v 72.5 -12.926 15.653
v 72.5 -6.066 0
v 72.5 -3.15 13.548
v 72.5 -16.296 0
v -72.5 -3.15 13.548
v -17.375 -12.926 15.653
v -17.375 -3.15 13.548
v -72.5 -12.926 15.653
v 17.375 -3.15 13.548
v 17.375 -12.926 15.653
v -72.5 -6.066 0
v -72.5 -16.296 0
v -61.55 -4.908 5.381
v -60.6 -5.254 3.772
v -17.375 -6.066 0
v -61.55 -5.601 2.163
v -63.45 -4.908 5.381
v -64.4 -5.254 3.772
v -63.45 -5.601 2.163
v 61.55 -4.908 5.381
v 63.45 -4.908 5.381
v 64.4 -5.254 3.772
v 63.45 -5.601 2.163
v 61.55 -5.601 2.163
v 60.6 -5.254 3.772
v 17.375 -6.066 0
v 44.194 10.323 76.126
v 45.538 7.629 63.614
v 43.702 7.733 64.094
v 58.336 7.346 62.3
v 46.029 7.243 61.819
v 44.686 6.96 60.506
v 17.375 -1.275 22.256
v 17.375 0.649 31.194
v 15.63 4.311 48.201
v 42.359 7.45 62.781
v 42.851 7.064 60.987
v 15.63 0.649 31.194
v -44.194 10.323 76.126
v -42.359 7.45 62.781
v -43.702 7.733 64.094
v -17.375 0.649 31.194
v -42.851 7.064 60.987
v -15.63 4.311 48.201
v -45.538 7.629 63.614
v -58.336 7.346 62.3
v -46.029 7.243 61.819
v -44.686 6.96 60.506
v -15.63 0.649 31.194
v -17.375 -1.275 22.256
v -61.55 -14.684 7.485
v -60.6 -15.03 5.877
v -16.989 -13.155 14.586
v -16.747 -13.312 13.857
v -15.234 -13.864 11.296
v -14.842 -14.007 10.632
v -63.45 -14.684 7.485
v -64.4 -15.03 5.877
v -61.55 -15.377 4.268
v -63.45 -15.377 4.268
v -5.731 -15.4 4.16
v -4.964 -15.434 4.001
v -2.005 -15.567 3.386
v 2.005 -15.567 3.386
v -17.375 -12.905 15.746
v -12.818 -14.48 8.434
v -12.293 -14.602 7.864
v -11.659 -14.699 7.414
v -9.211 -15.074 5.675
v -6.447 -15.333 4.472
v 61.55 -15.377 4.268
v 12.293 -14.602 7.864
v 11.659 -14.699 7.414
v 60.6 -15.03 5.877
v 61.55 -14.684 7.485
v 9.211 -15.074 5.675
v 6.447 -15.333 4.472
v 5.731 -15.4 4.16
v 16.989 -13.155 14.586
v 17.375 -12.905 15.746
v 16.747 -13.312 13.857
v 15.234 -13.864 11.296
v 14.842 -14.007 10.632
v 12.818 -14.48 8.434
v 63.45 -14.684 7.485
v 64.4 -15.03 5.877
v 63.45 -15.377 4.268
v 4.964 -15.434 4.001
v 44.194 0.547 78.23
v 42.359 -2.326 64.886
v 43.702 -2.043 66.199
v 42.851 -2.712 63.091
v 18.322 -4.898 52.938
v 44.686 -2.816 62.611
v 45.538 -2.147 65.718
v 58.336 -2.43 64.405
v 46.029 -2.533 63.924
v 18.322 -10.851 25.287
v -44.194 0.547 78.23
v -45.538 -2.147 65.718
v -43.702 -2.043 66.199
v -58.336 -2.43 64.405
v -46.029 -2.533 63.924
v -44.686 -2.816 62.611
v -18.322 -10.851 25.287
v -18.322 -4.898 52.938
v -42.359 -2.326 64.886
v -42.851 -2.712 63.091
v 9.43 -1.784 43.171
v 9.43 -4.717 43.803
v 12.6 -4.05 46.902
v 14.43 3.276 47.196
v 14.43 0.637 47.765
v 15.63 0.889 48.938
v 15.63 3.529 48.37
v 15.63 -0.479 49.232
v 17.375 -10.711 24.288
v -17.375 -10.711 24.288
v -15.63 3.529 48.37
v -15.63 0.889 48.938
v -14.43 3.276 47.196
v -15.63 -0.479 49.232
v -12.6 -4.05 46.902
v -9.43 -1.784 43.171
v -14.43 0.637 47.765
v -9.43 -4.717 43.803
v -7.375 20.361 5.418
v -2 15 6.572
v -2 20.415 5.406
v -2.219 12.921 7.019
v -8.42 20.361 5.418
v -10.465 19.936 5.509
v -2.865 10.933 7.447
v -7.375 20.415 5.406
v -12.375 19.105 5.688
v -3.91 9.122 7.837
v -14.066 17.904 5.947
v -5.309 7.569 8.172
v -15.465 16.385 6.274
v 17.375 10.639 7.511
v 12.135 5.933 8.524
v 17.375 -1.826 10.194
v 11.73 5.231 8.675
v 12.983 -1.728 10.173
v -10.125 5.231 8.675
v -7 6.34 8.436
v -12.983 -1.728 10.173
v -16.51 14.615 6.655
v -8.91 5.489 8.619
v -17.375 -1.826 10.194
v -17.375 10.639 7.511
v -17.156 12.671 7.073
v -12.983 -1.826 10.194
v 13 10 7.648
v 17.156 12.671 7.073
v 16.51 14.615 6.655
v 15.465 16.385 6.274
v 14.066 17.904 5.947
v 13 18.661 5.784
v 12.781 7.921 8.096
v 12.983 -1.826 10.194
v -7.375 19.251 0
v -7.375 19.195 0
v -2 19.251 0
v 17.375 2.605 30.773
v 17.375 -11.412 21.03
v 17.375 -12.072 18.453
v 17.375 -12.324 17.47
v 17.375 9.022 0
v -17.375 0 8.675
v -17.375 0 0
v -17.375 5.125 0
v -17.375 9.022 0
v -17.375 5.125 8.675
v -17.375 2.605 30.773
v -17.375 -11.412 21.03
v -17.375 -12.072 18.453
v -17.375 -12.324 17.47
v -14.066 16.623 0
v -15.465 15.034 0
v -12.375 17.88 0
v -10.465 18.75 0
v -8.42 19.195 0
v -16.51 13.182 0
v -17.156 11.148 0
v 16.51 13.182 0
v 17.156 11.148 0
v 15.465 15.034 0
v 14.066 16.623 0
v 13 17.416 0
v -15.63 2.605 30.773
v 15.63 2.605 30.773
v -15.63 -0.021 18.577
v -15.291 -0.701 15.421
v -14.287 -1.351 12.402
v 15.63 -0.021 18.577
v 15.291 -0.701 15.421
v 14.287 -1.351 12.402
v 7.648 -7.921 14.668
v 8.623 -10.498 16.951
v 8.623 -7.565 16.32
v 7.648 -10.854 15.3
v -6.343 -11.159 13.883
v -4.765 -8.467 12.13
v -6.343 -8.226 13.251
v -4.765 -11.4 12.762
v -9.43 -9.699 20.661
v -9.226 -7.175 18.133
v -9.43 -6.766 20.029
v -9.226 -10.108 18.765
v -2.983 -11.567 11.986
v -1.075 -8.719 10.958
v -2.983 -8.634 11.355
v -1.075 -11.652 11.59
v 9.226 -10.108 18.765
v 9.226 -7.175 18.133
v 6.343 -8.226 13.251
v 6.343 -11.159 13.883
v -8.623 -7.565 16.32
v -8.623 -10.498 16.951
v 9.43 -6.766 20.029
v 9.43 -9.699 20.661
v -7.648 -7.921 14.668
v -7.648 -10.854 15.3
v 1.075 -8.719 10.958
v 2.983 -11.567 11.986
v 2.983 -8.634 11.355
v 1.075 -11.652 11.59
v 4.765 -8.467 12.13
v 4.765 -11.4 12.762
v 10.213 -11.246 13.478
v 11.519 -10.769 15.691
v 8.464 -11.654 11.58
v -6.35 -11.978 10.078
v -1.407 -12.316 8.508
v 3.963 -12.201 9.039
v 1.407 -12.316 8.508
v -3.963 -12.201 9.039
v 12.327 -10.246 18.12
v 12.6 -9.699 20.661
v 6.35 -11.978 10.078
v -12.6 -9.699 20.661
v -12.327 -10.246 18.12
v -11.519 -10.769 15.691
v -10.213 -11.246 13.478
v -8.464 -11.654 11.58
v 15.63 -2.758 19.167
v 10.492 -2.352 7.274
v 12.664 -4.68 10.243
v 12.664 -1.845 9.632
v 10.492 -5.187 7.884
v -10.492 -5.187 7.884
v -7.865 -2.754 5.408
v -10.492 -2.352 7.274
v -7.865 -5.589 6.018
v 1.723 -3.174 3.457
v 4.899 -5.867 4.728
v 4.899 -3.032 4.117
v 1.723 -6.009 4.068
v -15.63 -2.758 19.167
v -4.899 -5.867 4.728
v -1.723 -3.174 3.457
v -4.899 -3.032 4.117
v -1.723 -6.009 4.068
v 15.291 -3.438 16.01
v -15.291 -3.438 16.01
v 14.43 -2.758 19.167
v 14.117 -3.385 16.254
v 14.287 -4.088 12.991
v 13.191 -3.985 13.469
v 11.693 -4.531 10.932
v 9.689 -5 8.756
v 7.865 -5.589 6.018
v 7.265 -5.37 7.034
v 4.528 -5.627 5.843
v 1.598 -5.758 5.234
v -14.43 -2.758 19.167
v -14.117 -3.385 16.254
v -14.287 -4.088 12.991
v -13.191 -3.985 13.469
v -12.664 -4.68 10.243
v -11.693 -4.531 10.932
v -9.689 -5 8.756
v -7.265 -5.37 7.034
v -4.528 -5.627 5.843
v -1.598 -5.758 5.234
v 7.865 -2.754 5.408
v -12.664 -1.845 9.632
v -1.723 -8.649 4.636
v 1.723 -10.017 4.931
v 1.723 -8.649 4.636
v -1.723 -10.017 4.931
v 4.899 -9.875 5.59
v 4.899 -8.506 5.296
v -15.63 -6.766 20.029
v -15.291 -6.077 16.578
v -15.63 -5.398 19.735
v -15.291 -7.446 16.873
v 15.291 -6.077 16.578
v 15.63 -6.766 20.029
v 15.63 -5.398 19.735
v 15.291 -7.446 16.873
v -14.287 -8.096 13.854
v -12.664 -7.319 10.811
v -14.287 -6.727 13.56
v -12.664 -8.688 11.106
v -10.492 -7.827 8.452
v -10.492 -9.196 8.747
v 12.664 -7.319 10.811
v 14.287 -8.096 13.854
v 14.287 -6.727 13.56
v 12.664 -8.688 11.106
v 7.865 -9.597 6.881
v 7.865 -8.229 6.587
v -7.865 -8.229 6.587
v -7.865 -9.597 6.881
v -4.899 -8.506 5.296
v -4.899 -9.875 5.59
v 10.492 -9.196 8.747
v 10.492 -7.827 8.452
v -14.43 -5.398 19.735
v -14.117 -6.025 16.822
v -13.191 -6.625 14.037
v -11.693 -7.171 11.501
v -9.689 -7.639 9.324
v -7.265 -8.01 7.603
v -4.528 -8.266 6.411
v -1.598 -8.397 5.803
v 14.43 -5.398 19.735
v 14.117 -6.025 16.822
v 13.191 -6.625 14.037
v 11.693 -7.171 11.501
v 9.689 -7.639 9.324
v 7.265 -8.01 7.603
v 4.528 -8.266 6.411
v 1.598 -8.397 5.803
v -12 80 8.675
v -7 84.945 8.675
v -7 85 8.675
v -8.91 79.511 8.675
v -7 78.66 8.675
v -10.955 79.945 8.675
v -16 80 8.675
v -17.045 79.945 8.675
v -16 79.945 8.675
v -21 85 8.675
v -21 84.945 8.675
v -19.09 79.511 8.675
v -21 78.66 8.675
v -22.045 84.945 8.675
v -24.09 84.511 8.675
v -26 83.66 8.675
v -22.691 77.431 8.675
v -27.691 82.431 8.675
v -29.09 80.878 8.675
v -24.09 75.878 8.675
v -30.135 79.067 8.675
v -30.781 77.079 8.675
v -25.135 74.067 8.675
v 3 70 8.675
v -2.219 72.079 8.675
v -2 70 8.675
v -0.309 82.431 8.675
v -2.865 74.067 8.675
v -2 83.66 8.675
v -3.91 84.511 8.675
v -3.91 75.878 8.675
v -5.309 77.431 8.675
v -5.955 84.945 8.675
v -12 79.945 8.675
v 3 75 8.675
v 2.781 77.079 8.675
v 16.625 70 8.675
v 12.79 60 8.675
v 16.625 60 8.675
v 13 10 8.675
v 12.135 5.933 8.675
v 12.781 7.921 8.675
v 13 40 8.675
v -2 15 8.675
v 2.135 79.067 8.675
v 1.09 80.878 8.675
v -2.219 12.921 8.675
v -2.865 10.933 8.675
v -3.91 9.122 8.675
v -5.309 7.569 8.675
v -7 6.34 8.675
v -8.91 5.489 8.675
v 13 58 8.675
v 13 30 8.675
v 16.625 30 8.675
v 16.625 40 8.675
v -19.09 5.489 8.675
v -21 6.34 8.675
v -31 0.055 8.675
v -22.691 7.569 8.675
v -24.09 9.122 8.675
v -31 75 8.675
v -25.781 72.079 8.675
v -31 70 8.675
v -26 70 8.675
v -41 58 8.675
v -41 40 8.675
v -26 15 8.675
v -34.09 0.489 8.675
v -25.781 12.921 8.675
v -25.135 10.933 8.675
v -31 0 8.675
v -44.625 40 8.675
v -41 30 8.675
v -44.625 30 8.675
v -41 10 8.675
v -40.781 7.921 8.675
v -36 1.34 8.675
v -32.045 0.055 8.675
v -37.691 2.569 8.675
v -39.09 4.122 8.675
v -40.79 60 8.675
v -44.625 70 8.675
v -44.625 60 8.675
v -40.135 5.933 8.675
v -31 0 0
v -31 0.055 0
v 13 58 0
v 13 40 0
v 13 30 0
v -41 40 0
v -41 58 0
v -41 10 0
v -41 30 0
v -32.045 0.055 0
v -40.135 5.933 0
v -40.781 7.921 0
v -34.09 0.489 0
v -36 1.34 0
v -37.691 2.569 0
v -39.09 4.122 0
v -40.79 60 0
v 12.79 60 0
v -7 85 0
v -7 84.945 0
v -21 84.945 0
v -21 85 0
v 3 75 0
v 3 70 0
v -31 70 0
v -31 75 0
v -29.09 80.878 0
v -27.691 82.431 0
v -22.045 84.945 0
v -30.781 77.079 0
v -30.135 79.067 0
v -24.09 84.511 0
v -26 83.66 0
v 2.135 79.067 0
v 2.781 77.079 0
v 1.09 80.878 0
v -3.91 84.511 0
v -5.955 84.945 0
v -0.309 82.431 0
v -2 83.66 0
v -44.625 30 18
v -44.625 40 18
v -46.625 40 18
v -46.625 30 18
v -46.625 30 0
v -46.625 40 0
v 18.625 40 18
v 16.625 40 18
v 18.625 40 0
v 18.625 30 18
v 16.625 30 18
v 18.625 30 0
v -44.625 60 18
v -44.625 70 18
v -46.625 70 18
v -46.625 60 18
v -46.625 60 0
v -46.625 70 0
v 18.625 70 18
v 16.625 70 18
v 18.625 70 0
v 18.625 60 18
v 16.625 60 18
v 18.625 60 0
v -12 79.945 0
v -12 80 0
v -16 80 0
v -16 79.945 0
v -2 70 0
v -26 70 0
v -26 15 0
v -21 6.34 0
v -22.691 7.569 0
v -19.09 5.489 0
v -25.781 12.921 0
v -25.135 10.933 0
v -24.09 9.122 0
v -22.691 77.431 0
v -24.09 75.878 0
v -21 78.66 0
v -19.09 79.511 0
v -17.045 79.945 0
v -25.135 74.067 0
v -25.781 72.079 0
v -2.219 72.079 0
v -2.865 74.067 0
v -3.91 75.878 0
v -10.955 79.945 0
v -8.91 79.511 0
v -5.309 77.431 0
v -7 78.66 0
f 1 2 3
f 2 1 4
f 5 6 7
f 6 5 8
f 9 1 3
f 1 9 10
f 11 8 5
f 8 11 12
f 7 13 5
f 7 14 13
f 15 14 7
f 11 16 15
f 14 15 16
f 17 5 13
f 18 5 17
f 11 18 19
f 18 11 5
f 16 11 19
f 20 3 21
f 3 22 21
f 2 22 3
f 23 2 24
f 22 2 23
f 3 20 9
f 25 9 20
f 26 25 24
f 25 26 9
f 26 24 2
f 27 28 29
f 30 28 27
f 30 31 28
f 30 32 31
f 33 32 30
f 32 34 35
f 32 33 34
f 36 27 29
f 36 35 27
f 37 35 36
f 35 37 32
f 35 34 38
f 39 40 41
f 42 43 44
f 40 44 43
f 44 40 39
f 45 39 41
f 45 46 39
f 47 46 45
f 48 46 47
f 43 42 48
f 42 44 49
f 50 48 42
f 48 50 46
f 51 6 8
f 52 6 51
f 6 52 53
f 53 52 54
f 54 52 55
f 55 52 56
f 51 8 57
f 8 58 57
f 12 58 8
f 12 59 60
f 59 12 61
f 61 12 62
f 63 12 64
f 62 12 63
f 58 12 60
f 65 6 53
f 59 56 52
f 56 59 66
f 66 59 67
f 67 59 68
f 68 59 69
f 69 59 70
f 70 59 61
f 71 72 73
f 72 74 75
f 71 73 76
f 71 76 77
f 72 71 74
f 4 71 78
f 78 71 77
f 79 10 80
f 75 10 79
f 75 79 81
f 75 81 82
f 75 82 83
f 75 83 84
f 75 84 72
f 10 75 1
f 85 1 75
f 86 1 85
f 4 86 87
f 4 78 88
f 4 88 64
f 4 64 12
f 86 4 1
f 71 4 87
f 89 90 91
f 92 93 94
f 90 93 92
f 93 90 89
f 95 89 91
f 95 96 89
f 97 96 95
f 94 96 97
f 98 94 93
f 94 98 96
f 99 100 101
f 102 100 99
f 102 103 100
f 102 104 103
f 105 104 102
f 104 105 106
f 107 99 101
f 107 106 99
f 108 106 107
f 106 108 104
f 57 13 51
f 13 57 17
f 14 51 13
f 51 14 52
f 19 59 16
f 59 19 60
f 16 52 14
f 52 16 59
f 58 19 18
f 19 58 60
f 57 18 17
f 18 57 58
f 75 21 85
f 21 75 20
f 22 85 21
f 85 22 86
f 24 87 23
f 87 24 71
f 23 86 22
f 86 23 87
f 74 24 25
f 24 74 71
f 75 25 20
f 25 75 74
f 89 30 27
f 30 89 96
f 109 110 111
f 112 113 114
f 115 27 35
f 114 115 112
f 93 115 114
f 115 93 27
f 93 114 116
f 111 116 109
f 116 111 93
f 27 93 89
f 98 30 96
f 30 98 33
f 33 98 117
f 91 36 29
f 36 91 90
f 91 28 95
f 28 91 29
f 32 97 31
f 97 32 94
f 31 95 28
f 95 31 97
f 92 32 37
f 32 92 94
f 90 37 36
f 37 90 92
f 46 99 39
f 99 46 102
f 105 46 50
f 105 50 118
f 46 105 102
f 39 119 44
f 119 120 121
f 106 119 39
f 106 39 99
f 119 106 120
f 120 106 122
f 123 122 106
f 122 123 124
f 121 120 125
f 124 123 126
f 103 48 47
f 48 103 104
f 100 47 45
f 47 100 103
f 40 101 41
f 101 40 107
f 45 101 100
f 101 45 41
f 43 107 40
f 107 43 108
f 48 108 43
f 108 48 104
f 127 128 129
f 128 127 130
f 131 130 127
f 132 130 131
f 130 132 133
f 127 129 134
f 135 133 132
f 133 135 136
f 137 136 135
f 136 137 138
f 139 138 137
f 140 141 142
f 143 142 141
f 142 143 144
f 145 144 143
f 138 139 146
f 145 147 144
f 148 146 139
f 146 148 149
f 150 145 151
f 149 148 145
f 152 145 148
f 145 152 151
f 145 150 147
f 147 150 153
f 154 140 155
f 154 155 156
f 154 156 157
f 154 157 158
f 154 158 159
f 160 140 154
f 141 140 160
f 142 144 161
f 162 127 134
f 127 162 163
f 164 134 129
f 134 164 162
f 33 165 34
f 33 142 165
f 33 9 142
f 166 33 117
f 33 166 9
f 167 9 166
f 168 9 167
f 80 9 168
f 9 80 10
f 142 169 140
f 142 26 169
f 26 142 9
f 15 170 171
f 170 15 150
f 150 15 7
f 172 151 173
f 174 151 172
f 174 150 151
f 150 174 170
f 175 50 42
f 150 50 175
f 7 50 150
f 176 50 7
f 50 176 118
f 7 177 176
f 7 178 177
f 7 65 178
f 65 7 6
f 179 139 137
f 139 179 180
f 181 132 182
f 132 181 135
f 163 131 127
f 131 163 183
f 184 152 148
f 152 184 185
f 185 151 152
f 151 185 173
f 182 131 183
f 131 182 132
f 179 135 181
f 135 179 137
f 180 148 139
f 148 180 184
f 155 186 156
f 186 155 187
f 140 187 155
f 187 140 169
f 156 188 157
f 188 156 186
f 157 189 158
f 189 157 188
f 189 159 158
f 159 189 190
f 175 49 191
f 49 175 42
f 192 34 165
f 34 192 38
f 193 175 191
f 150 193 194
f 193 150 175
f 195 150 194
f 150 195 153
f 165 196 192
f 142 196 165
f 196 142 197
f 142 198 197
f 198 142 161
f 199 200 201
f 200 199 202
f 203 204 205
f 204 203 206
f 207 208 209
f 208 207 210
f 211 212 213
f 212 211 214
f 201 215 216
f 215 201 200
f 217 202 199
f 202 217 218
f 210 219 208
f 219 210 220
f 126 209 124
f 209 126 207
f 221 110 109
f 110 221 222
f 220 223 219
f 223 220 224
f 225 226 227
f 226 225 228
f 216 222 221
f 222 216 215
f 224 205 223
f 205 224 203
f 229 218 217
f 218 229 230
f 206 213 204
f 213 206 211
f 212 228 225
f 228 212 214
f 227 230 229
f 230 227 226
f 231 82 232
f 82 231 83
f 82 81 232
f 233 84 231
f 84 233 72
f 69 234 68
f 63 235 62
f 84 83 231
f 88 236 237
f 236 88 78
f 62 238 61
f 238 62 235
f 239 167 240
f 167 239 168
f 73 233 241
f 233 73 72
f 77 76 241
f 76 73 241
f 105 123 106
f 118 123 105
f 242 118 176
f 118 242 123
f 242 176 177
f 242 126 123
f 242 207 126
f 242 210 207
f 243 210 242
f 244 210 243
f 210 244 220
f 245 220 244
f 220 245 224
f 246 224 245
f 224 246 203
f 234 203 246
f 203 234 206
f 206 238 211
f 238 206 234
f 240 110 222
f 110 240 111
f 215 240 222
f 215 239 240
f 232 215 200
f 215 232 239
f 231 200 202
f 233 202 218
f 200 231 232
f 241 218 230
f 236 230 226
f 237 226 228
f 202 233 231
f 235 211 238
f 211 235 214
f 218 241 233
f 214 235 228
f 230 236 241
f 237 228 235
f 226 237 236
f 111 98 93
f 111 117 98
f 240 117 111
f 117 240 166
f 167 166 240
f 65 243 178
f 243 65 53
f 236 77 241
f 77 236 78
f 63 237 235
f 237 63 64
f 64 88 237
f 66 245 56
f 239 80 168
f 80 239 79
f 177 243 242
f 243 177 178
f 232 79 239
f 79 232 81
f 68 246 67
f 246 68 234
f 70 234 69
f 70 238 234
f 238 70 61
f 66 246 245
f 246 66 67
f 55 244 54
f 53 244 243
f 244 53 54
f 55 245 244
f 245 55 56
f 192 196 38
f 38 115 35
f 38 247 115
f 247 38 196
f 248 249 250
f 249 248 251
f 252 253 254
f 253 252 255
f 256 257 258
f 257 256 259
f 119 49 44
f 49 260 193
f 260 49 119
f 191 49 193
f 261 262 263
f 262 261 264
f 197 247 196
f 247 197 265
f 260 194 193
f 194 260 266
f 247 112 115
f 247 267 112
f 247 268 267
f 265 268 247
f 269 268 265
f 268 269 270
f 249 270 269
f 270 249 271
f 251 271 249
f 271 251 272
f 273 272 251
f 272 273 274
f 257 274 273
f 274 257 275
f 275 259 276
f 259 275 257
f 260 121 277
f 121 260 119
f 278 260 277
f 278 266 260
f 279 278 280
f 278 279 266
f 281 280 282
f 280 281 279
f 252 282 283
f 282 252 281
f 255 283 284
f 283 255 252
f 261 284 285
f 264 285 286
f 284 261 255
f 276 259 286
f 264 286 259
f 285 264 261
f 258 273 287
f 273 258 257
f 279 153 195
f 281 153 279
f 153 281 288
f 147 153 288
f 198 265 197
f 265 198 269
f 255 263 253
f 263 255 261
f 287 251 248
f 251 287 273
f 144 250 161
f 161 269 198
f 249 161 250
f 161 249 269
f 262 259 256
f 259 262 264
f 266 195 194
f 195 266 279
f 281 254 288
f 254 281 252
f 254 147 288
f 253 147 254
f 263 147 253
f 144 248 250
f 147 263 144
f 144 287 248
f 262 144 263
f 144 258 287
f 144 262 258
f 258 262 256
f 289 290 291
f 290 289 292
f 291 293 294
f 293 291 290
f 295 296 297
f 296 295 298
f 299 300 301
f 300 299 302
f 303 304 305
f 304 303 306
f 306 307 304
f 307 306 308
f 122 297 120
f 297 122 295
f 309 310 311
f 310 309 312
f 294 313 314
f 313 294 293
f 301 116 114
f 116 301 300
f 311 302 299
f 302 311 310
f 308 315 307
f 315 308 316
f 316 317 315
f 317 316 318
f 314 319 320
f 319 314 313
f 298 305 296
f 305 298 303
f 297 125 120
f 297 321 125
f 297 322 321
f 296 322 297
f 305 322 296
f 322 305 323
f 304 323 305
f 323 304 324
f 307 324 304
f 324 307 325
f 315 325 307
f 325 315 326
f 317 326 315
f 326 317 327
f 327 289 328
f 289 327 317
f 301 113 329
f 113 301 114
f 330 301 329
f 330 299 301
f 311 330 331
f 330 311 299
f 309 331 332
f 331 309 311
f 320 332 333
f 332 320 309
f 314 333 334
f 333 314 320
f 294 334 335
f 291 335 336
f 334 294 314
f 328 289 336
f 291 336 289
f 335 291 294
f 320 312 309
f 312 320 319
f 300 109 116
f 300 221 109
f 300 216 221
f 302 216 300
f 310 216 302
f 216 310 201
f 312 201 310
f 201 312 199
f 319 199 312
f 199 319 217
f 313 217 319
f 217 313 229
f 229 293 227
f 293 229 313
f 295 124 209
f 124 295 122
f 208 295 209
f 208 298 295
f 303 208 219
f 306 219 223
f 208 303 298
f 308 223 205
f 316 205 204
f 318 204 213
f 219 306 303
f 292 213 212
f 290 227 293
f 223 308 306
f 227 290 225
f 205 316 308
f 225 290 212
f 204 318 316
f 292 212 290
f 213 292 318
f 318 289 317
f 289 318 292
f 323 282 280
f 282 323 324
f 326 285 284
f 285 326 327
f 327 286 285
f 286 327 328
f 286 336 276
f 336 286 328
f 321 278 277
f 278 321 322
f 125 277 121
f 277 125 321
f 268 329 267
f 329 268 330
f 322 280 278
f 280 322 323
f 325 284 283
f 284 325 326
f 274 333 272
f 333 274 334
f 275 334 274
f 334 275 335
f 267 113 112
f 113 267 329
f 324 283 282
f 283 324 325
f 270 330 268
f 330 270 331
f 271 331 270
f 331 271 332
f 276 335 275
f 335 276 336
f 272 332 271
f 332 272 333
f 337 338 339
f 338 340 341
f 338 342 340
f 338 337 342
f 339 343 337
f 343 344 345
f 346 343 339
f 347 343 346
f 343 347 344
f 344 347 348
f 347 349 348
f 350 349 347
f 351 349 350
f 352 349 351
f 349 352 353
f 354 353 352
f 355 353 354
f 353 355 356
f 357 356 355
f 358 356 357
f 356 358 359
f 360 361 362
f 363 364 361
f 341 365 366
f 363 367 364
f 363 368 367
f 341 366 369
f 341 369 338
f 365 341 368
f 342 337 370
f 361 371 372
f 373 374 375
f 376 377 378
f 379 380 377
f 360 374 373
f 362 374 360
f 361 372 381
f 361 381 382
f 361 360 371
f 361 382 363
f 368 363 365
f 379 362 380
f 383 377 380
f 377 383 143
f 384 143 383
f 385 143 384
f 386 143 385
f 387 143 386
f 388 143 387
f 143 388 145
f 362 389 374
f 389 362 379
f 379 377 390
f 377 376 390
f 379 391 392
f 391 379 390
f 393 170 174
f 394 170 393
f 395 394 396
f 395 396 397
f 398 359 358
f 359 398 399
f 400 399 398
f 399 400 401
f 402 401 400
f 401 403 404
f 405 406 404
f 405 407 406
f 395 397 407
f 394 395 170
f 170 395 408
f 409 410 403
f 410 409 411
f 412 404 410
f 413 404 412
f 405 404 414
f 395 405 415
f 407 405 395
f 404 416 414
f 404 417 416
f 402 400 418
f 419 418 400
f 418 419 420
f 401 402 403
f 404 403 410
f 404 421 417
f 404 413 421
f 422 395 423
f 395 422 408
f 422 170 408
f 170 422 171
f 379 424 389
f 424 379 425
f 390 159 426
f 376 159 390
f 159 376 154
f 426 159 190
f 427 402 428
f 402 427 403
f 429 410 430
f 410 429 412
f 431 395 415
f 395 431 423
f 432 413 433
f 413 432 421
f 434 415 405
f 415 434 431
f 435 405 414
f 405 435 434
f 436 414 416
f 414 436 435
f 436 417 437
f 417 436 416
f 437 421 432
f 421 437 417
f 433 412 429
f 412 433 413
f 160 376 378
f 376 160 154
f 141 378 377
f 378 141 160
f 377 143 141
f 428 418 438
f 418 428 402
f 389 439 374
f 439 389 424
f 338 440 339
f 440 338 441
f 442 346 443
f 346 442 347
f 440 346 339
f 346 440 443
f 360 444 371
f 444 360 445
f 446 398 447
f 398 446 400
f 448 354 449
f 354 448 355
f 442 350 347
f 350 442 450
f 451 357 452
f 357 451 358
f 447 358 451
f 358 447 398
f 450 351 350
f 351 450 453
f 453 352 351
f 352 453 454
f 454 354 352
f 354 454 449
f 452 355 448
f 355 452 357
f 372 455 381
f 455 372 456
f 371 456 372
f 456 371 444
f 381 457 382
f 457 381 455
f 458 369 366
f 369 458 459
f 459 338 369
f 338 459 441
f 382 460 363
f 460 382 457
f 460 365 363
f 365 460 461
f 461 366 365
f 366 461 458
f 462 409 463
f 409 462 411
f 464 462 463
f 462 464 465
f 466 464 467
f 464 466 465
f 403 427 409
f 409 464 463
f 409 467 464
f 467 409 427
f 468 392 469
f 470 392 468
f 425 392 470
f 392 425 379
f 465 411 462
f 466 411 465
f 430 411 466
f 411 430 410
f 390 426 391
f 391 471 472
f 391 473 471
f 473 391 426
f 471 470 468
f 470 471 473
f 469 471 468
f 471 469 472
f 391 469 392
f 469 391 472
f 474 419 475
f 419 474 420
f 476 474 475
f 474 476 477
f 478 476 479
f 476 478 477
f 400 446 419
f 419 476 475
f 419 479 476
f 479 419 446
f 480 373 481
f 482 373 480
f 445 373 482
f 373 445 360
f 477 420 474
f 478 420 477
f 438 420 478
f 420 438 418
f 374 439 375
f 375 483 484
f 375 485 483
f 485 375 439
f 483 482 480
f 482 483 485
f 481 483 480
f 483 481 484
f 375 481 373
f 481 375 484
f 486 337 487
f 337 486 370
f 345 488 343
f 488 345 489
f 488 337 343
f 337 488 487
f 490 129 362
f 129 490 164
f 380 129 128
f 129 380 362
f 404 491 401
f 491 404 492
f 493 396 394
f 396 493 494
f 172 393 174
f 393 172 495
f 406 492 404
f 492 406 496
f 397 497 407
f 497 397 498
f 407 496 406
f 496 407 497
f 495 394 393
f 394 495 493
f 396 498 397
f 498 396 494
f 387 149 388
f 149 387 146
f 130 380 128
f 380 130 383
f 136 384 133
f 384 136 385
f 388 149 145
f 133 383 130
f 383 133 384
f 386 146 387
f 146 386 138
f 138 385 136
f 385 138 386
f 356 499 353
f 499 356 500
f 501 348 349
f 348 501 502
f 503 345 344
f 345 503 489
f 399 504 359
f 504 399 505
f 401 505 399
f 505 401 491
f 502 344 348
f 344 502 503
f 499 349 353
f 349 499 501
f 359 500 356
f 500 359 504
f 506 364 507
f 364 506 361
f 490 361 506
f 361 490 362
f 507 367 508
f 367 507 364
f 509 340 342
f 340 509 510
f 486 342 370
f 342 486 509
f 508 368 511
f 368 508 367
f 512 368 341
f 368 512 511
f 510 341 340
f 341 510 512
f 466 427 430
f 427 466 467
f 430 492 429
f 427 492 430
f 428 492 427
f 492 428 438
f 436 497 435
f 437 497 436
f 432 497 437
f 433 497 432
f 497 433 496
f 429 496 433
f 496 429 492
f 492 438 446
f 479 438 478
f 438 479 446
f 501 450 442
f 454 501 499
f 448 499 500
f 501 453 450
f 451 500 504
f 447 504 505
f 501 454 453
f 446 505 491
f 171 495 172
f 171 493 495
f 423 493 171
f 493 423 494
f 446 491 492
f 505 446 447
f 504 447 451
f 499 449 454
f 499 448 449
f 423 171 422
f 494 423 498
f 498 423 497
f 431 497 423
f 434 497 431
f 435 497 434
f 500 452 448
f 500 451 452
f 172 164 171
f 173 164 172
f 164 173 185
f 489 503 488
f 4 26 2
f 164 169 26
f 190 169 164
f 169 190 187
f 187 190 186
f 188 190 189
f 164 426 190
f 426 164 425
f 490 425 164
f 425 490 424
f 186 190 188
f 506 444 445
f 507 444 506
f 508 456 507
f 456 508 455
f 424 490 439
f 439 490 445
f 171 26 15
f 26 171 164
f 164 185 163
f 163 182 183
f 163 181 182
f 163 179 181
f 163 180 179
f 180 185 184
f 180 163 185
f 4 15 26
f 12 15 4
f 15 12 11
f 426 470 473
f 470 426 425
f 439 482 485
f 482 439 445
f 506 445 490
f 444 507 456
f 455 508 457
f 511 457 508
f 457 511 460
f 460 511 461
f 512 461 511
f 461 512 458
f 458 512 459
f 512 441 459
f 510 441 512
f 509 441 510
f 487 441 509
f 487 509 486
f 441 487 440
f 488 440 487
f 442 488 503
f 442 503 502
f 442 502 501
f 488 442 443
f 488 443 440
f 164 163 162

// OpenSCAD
opteka_r1 = 24.75/2;
opteka_r2 = 41.35/2;

module rounded(size, r) {
    union() {
        translate([r, 0, 0]) cube([size[0]-2*r, size[1], size[2]]);
        translate([0, r, 0]) cube([size[0], size[1]-2*r, size[2]]);
        translate([r, r, 0]) cylinder(h=size[2], r=r);
        translate([size[0]-r, r, 0]) cylinder(h=size[2], r=r);
        translate([r, size[1]-r, 0]) cylinder(h=size[2], r=r);
        translate([size[0]-r, size[1]-r, 0]) cylinder(h=size[2], r=r);
    }
}

module opteka() {
    union() {
        cylinder(r=31.06/2, h=2.70);
        translate([0, 0,  2.70]) cylinder(r=28.66/2, h=2.9);
        translate([0, 0,  5.60]) cylinder(r=31.06/2, h=1.2);
        cylinder(r=18.66/2, h=10);
        translate([0, 0, 10.00]) cylinder(r1=25/2, r2=opteka_r2, h=3);
        translate([0, 0, 13.00]) cylinder(r=opteka_r2, h=8.42);
    }
}

module old_opteka() {
    union() {
        cylinder(r=23.06/2, h=7);
        translate([0, 0, 3]) cylinder(r=opteka_r1, h=2.5);
        cylinder(r=18.66/2, h=10);
        translate([0, 0, 10]) cylinder(r1=25/2, r2=opteka_r2, h=3);
        translate([0, 0, 13]) cylinder(r=opteka_r2, h=8.42);
    }
}

margin = 0.1;
angle = -12.15;
wall = 5;
wall2 = 2;
image_h = 10;

showwx_offset = 14;
showwx_w = 61.25;
showwx_wb = 54;
showwx_wb2 = 34;
showwx_l1 = 68;
showwx_l2 = 85;

globe_r1 = 98/2;
globe_r2 = 105/2;
globe_h = 15;
globe_bolt = 3.8/2;

module lens_mount() difference() {
    translate([0, 0, -2]) union() {
        translate([0, 0, opteka_r2]) rotate([angle, 0, 0]) difference() {
            union() {
                difference() {
                    translate([-globe_r2-4*wall, -12, -opteka_r2-wall]) cube([2*(globe_r2+4*wall), 2*wall, 4*wall]);
                    translate([-globe_r2-2*wall, -12, -opteka_r2+wall]) rotate([-90, 0, 0]) cylinder(r=globe_bolt, h=20);
                    translate([globe_r2+2*wall, -12, -opteka_r2+wall]) rotate([-90, 0, 0]) cylinder(r=globe_bolt, h=20);
                }
                for(t = [-45, -135]) {
                    rotate([0, t, 0]) translate([0, -12, -2*wall]) difference() {
                        cube([globe_r2+4*wall, 2*wall, 4*wall]);
                        translate([globe_r2+2*wall, 0, 2*wall]) rotate([-90, 0, 0]) cylinder(r=globe_bolt, h=globe_h);
                    }
                }
                translate([-opteka_r1-wall, -12, -opteka_r2-wall]) union() {
                    cube([2*(opteka_r1+wall), 12, (opteka_r2+wall+opteka_r1)]);
                    rounded([2*(opteka_r1+wall), 2*(opteka_r1+wall), 17], 10);
                }
            }
            minkowski() {
                rotate([90, 0, 0]) opteka();
                translate([-margin, -margin, -margin]) cube([margin*2, margin*2, 50+margin]);
            }
        }
        
        
        translate([-showwx_offset, 0, 0]) difference() {
            union() {
                translate([-showwx_wb/2, 0, 0]) rounded([showwx_wb, showwx_l1, opteka_r2-image_h], 10);
                translate([-showwx_wb2/2, 0, 0]) rounded([showwx_wb2, showwx_l2, opteka_r2-image_h], 10);
                for(y = [30, 60]) {
                    union() {
                        translate([-showwx_w/2-wall2, y, 0]) cube([wall2, 10, 20]);
                        translate([showwx_w/2, y, 0]) cube([wall2, 10, 20]);
                        translate([-showwx_w/2, y, 0]) cube([showwx_w, 10, opteka_r2-image_h]);
                    }
                }
            }
            translate([-showwx_wb2/2+wall, wall, 0]) rounded([showwx_wb2-2*wall, showwx_l2-2*wall, 50], 10);
        }
    }
    
    translate([-200, -200, -100]) cube([400, 400, 100]);
}

module globe_mount() {
    difference() {
        union() {
            cylinder(r1=globe_r2+wall, r2=globe_r1+wall, h=globe_h);
            translate([-globe_r2-4*wall, -opteka_r2-wall, 0]) difference() {
                rounded([2*(globe_r2+4*wall), 4*wall, wall],2);
                translate([2*wall, 2*wall, 0]) cylinder(r=globe_bolt, h=globe_h);
                translate([2*globe_r2+6*wall, 2*wall, 0]) cylinder(r=globe_bolt, h=globe_h);
            }
            for(t = [45, 135]) {
                rotate([0, 0, t]) translate([0, -2*wall, 0]) difference() {
                    rounded([globe_r2+4*wall, 4*wall, wall], 2);
                    translate([globe_r2+2*wall, 2*wall, 0]) cylinder(r=globe_bolt, h=globe_h);
                }
            }
            for(i = [0:11]) {
                rotate([0, 0, i*360/12]) translate([-globe_r2-wall, -wall, 0]) cube([20, 2*wall, globe_h/2+wall]);
            }
        }
        cylinder(r1=globe_r2, r2=globe_r1, h=globe_h-wall);
        cylinder(r=globe_r1, h=globe_h+1);
        translate([-wall, -globe_r2-2*wall, 0]) cube([2*wall, 2*(globe_r2+2*wall), globe_h+1]);
        for(i = [0:11]) {
            rotate([0, 0, i*360/12]) translate([-globe_r2-wall, 0, globe_h/2]) rotate([0, 90, 0]) cylinder(r=globe_bolt, h=20);
        }
    }
}

lens_mount();

//globe_mount();
